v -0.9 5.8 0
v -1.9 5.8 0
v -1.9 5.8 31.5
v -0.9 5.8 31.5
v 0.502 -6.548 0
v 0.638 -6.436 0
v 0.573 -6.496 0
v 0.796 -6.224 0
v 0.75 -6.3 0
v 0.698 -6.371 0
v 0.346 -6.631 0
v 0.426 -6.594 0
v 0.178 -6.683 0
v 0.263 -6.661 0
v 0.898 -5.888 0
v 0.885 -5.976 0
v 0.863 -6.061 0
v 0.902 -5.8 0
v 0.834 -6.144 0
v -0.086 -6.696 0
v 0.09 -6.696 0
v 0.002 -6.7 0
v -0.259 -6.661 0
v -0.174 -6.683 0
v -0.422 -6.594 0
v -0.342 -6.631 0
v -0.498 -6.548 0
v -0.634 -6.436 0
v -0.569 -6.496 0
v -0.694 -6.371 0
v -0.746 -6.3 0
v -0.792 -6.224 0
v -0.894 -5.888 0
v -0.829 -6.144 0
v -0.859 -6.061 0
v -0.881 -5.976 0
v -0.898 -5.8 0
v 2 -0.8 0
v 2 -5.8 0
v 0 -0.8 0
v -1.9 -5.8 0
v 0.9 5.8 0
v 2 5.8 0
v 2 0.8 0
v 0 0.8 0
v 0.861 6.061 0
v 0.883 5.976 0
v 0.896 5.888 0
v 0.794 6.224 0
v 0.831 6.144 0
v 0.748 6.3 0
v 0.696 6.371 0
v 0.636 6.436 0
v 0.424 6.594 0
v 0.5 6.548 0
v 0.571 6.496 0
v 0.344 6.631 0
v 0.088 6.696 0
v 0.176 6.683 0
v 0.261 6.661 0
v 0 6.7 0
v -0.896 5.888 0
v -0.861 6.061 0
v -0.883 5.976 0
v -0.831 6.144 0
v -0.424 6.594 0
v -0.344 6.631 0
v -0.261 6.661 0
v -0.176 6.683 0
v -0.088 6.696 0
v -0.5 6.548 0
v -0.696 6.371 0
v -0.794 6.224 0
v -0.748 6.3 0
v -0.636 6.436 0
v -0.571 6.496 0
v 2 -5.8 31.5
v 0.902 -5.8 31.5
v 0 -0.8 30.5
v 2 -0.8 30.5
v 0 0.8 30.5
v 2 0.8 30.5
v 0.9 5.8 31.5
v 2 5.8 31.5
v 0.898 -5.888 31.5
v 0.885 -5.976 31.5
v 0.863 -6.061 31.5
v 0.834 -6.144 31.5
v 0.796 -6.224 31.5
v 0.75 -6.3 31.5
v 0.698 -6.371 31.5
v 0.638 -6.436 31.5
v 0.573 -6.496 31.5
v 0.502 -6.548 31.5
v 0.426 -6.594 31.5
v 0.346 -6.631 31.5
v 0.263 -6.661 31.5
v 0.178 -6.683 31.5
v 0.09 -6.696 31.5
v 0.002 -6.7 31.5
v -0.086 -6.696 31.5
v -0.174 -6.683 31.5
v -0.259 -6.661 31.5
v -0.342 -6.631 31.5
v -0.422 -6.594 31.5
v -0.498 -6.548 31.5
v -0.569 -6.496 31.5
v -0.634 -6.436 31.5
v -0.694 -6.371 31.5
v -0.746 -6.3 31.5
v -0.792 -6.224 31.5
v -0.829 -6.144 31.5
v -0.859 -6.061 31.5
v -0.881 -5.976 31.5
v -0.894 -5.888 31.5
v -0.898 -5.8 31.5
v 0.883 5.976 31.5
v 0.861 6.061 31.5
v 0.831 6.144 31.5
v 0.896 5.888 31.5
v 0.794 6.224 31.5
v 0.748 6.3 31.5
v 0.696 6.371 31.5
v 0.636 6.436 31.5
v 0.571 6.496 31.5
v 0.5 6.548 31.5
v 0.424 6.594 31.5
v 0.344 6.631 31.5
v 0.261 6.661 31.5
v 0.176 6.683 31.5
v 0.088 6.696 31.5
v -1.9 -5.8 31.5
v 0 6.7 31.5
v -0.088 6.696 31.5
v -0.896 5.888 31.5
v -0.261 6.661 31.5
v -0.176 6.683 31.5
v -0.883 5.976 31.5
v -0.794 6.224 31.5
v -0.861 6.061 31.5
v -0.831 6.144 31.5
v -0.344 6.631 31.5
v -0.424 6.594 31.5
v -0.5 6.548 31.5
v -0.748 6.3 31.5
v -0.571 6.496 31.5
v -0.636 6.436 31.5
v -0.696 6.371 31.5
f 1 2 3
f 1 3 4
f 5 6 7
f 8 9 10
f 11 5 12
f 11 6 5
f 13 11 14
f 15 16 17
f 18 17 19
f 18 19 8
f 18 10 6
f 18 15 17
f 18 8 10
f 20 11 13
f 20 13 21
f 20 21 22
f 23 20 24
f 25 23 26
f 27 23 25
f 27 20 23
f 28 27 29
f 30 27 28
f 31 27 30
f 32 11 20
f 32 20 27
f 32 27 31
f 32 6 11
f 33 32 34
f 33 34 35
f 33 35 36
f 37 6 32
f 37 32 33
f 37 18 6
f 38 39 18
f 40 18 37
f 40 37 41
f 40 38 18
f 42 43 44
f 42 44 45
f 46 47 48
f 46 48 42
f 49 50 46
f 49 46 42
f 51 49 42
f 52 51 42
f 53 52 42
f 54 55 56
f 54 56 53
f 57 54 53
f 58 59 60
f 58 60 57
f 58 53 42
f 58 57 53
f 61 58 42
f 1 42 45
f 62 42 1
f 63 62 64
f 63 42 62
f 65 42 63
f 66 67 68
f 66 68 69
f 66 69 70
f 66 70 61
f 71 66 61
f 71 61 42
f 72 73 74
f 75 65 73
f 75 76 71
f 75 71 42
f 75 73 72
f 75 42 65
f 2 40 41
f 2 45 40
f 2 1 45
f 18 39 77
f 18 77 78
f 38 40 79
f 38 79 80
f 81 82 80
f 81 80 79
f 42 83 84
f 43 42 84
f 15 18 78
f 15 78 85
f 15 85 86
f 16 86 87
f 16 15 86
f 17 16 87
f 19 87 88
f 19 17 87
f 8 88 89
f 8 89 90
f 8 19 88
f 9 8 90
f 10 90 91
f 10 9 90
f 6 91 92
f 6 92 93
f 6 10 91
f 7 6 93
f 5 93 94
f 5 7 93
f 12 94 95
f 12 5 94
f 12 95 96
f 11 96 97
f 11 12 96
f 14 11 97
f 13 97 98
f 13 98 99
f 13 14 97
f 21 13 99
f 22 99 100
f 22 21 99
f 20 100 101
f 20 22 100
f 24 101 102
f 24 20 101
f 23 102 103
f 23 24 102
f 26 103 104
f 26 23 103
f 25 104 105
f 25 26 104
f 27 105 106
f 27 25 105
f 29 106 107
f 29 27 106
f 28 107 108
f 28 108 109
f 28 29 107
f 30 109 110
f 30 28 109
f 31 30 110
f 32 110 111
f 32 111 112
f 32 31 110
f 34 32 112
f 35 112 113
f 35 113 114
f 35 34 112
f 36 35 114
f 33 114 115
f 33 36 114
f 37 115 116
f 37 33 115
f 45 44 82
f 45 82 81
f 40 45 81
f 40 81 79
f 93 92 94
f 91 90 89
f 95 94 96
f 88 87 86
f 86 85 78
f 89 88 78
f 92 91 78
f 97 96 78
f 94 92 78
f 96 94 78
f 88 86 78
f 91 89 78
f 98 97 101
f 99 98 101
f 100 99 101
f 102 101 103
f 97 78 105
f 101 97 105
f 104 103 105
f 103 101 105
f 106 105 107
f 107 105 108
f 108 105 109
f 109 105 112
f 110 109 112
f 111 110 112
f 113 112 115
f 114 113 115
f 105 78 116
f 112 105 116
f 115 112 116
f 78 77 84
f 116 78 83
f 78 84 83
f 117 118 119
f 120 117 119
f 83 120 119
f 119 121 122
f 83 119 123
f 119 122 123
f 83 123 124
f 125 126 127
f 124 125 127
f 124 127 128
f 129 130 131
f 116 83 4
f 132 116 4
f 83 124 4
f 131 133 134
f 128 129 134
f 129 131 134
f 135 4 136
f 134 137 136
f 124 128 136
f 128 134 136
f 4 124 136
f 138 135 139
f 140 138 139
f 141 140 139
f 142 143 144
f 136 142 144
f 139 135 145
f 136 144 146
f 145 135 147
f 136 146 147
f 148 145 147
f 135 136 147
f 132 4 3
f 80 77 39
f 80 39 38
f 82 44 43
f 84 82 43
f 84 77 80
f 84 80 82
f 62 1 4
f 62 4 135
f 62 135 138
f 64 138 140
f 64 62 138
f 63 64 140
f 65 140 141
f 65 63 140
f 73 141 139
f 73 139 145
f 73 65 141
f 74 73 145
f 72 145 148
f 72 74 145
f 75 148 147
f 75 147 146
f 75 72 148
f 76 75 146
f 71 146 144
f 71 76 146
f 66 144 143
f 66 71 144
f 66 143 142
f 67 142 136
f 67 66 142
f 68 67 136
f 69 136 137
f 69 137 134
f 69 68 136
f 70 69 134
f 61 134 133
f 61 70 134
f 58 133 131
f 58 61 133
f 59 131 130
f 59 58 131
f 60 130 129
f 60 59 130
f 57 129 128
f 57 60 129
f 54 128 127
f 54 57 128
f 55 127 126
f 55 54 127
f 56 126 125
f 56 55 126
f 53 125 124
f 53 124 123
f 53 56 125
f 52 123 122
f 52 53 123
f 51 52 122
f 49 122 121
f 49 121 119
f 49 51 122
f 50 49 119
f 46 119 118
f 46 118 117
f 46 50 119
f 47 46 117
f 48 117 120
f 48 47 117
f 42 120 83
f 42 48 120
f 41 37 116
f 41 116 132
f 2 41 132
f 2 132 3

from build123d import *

# Parameters (mm, degrees)
BOSS_EXTRUDE1_DEPTH = 31.5
BOSS_EXTRUDE2_START = -31.5
SKETCH2_W           = 2
SKETCH2_H           = 1.6
BOSS_EXTRUDE2_DEPTH = 1


with BuildPart() as part:
    # Sketch1 → Boss-Extrude1 (new body)
    with BuildSketch(Plane.XY):
        with BuildLine():
            Line((-1.9, 5.8), (-0.9, 5.8))
            ThreePointArc((-0.9, 5.8), (0, 6.7), (0.9, 5.8))
            Line((0.9, 5.8), (2, 5.8))
            Line((2, 5.8), (2, 0.8))
            Line((2, 0.8), (0, 0.8))
            Line((0, 0.8), (0, -0.8))
            Line((0, -0.8), (2, -0.8))
            Line((2, -0.8), (2, -5.8))
            Line((2, -5.8), (0.90202041, -5.8))
            ThreePointArc((0.90202041, -5.8), (0.00202041, -6.7), (-0.89797959, -5.8))
            Line((-0.89797959, -5.8), (-1.9, -5.8))
            Line((-1.9, -5.8), (-1.9, 5.8))
        make_face()
    extrude(amount=BOSS_EXTRUDE1_DEPTH)

    # Sketch2 → Boss-Extrude2 (add)
    with BuildSketch(Plane(origin=(0, 0, 0), x_dir=(-1, 0, 0), z_dir=(0, 0, -1)).offset(BOSS_EXTRUDE2_START)):
        with Locations((-1, 0)):
            Rectangle(SKETCH2_W, SKETCH2_H)
    extrude(amount=BOSS_EXTRUDE2_DEPTH)


solid = part.part
